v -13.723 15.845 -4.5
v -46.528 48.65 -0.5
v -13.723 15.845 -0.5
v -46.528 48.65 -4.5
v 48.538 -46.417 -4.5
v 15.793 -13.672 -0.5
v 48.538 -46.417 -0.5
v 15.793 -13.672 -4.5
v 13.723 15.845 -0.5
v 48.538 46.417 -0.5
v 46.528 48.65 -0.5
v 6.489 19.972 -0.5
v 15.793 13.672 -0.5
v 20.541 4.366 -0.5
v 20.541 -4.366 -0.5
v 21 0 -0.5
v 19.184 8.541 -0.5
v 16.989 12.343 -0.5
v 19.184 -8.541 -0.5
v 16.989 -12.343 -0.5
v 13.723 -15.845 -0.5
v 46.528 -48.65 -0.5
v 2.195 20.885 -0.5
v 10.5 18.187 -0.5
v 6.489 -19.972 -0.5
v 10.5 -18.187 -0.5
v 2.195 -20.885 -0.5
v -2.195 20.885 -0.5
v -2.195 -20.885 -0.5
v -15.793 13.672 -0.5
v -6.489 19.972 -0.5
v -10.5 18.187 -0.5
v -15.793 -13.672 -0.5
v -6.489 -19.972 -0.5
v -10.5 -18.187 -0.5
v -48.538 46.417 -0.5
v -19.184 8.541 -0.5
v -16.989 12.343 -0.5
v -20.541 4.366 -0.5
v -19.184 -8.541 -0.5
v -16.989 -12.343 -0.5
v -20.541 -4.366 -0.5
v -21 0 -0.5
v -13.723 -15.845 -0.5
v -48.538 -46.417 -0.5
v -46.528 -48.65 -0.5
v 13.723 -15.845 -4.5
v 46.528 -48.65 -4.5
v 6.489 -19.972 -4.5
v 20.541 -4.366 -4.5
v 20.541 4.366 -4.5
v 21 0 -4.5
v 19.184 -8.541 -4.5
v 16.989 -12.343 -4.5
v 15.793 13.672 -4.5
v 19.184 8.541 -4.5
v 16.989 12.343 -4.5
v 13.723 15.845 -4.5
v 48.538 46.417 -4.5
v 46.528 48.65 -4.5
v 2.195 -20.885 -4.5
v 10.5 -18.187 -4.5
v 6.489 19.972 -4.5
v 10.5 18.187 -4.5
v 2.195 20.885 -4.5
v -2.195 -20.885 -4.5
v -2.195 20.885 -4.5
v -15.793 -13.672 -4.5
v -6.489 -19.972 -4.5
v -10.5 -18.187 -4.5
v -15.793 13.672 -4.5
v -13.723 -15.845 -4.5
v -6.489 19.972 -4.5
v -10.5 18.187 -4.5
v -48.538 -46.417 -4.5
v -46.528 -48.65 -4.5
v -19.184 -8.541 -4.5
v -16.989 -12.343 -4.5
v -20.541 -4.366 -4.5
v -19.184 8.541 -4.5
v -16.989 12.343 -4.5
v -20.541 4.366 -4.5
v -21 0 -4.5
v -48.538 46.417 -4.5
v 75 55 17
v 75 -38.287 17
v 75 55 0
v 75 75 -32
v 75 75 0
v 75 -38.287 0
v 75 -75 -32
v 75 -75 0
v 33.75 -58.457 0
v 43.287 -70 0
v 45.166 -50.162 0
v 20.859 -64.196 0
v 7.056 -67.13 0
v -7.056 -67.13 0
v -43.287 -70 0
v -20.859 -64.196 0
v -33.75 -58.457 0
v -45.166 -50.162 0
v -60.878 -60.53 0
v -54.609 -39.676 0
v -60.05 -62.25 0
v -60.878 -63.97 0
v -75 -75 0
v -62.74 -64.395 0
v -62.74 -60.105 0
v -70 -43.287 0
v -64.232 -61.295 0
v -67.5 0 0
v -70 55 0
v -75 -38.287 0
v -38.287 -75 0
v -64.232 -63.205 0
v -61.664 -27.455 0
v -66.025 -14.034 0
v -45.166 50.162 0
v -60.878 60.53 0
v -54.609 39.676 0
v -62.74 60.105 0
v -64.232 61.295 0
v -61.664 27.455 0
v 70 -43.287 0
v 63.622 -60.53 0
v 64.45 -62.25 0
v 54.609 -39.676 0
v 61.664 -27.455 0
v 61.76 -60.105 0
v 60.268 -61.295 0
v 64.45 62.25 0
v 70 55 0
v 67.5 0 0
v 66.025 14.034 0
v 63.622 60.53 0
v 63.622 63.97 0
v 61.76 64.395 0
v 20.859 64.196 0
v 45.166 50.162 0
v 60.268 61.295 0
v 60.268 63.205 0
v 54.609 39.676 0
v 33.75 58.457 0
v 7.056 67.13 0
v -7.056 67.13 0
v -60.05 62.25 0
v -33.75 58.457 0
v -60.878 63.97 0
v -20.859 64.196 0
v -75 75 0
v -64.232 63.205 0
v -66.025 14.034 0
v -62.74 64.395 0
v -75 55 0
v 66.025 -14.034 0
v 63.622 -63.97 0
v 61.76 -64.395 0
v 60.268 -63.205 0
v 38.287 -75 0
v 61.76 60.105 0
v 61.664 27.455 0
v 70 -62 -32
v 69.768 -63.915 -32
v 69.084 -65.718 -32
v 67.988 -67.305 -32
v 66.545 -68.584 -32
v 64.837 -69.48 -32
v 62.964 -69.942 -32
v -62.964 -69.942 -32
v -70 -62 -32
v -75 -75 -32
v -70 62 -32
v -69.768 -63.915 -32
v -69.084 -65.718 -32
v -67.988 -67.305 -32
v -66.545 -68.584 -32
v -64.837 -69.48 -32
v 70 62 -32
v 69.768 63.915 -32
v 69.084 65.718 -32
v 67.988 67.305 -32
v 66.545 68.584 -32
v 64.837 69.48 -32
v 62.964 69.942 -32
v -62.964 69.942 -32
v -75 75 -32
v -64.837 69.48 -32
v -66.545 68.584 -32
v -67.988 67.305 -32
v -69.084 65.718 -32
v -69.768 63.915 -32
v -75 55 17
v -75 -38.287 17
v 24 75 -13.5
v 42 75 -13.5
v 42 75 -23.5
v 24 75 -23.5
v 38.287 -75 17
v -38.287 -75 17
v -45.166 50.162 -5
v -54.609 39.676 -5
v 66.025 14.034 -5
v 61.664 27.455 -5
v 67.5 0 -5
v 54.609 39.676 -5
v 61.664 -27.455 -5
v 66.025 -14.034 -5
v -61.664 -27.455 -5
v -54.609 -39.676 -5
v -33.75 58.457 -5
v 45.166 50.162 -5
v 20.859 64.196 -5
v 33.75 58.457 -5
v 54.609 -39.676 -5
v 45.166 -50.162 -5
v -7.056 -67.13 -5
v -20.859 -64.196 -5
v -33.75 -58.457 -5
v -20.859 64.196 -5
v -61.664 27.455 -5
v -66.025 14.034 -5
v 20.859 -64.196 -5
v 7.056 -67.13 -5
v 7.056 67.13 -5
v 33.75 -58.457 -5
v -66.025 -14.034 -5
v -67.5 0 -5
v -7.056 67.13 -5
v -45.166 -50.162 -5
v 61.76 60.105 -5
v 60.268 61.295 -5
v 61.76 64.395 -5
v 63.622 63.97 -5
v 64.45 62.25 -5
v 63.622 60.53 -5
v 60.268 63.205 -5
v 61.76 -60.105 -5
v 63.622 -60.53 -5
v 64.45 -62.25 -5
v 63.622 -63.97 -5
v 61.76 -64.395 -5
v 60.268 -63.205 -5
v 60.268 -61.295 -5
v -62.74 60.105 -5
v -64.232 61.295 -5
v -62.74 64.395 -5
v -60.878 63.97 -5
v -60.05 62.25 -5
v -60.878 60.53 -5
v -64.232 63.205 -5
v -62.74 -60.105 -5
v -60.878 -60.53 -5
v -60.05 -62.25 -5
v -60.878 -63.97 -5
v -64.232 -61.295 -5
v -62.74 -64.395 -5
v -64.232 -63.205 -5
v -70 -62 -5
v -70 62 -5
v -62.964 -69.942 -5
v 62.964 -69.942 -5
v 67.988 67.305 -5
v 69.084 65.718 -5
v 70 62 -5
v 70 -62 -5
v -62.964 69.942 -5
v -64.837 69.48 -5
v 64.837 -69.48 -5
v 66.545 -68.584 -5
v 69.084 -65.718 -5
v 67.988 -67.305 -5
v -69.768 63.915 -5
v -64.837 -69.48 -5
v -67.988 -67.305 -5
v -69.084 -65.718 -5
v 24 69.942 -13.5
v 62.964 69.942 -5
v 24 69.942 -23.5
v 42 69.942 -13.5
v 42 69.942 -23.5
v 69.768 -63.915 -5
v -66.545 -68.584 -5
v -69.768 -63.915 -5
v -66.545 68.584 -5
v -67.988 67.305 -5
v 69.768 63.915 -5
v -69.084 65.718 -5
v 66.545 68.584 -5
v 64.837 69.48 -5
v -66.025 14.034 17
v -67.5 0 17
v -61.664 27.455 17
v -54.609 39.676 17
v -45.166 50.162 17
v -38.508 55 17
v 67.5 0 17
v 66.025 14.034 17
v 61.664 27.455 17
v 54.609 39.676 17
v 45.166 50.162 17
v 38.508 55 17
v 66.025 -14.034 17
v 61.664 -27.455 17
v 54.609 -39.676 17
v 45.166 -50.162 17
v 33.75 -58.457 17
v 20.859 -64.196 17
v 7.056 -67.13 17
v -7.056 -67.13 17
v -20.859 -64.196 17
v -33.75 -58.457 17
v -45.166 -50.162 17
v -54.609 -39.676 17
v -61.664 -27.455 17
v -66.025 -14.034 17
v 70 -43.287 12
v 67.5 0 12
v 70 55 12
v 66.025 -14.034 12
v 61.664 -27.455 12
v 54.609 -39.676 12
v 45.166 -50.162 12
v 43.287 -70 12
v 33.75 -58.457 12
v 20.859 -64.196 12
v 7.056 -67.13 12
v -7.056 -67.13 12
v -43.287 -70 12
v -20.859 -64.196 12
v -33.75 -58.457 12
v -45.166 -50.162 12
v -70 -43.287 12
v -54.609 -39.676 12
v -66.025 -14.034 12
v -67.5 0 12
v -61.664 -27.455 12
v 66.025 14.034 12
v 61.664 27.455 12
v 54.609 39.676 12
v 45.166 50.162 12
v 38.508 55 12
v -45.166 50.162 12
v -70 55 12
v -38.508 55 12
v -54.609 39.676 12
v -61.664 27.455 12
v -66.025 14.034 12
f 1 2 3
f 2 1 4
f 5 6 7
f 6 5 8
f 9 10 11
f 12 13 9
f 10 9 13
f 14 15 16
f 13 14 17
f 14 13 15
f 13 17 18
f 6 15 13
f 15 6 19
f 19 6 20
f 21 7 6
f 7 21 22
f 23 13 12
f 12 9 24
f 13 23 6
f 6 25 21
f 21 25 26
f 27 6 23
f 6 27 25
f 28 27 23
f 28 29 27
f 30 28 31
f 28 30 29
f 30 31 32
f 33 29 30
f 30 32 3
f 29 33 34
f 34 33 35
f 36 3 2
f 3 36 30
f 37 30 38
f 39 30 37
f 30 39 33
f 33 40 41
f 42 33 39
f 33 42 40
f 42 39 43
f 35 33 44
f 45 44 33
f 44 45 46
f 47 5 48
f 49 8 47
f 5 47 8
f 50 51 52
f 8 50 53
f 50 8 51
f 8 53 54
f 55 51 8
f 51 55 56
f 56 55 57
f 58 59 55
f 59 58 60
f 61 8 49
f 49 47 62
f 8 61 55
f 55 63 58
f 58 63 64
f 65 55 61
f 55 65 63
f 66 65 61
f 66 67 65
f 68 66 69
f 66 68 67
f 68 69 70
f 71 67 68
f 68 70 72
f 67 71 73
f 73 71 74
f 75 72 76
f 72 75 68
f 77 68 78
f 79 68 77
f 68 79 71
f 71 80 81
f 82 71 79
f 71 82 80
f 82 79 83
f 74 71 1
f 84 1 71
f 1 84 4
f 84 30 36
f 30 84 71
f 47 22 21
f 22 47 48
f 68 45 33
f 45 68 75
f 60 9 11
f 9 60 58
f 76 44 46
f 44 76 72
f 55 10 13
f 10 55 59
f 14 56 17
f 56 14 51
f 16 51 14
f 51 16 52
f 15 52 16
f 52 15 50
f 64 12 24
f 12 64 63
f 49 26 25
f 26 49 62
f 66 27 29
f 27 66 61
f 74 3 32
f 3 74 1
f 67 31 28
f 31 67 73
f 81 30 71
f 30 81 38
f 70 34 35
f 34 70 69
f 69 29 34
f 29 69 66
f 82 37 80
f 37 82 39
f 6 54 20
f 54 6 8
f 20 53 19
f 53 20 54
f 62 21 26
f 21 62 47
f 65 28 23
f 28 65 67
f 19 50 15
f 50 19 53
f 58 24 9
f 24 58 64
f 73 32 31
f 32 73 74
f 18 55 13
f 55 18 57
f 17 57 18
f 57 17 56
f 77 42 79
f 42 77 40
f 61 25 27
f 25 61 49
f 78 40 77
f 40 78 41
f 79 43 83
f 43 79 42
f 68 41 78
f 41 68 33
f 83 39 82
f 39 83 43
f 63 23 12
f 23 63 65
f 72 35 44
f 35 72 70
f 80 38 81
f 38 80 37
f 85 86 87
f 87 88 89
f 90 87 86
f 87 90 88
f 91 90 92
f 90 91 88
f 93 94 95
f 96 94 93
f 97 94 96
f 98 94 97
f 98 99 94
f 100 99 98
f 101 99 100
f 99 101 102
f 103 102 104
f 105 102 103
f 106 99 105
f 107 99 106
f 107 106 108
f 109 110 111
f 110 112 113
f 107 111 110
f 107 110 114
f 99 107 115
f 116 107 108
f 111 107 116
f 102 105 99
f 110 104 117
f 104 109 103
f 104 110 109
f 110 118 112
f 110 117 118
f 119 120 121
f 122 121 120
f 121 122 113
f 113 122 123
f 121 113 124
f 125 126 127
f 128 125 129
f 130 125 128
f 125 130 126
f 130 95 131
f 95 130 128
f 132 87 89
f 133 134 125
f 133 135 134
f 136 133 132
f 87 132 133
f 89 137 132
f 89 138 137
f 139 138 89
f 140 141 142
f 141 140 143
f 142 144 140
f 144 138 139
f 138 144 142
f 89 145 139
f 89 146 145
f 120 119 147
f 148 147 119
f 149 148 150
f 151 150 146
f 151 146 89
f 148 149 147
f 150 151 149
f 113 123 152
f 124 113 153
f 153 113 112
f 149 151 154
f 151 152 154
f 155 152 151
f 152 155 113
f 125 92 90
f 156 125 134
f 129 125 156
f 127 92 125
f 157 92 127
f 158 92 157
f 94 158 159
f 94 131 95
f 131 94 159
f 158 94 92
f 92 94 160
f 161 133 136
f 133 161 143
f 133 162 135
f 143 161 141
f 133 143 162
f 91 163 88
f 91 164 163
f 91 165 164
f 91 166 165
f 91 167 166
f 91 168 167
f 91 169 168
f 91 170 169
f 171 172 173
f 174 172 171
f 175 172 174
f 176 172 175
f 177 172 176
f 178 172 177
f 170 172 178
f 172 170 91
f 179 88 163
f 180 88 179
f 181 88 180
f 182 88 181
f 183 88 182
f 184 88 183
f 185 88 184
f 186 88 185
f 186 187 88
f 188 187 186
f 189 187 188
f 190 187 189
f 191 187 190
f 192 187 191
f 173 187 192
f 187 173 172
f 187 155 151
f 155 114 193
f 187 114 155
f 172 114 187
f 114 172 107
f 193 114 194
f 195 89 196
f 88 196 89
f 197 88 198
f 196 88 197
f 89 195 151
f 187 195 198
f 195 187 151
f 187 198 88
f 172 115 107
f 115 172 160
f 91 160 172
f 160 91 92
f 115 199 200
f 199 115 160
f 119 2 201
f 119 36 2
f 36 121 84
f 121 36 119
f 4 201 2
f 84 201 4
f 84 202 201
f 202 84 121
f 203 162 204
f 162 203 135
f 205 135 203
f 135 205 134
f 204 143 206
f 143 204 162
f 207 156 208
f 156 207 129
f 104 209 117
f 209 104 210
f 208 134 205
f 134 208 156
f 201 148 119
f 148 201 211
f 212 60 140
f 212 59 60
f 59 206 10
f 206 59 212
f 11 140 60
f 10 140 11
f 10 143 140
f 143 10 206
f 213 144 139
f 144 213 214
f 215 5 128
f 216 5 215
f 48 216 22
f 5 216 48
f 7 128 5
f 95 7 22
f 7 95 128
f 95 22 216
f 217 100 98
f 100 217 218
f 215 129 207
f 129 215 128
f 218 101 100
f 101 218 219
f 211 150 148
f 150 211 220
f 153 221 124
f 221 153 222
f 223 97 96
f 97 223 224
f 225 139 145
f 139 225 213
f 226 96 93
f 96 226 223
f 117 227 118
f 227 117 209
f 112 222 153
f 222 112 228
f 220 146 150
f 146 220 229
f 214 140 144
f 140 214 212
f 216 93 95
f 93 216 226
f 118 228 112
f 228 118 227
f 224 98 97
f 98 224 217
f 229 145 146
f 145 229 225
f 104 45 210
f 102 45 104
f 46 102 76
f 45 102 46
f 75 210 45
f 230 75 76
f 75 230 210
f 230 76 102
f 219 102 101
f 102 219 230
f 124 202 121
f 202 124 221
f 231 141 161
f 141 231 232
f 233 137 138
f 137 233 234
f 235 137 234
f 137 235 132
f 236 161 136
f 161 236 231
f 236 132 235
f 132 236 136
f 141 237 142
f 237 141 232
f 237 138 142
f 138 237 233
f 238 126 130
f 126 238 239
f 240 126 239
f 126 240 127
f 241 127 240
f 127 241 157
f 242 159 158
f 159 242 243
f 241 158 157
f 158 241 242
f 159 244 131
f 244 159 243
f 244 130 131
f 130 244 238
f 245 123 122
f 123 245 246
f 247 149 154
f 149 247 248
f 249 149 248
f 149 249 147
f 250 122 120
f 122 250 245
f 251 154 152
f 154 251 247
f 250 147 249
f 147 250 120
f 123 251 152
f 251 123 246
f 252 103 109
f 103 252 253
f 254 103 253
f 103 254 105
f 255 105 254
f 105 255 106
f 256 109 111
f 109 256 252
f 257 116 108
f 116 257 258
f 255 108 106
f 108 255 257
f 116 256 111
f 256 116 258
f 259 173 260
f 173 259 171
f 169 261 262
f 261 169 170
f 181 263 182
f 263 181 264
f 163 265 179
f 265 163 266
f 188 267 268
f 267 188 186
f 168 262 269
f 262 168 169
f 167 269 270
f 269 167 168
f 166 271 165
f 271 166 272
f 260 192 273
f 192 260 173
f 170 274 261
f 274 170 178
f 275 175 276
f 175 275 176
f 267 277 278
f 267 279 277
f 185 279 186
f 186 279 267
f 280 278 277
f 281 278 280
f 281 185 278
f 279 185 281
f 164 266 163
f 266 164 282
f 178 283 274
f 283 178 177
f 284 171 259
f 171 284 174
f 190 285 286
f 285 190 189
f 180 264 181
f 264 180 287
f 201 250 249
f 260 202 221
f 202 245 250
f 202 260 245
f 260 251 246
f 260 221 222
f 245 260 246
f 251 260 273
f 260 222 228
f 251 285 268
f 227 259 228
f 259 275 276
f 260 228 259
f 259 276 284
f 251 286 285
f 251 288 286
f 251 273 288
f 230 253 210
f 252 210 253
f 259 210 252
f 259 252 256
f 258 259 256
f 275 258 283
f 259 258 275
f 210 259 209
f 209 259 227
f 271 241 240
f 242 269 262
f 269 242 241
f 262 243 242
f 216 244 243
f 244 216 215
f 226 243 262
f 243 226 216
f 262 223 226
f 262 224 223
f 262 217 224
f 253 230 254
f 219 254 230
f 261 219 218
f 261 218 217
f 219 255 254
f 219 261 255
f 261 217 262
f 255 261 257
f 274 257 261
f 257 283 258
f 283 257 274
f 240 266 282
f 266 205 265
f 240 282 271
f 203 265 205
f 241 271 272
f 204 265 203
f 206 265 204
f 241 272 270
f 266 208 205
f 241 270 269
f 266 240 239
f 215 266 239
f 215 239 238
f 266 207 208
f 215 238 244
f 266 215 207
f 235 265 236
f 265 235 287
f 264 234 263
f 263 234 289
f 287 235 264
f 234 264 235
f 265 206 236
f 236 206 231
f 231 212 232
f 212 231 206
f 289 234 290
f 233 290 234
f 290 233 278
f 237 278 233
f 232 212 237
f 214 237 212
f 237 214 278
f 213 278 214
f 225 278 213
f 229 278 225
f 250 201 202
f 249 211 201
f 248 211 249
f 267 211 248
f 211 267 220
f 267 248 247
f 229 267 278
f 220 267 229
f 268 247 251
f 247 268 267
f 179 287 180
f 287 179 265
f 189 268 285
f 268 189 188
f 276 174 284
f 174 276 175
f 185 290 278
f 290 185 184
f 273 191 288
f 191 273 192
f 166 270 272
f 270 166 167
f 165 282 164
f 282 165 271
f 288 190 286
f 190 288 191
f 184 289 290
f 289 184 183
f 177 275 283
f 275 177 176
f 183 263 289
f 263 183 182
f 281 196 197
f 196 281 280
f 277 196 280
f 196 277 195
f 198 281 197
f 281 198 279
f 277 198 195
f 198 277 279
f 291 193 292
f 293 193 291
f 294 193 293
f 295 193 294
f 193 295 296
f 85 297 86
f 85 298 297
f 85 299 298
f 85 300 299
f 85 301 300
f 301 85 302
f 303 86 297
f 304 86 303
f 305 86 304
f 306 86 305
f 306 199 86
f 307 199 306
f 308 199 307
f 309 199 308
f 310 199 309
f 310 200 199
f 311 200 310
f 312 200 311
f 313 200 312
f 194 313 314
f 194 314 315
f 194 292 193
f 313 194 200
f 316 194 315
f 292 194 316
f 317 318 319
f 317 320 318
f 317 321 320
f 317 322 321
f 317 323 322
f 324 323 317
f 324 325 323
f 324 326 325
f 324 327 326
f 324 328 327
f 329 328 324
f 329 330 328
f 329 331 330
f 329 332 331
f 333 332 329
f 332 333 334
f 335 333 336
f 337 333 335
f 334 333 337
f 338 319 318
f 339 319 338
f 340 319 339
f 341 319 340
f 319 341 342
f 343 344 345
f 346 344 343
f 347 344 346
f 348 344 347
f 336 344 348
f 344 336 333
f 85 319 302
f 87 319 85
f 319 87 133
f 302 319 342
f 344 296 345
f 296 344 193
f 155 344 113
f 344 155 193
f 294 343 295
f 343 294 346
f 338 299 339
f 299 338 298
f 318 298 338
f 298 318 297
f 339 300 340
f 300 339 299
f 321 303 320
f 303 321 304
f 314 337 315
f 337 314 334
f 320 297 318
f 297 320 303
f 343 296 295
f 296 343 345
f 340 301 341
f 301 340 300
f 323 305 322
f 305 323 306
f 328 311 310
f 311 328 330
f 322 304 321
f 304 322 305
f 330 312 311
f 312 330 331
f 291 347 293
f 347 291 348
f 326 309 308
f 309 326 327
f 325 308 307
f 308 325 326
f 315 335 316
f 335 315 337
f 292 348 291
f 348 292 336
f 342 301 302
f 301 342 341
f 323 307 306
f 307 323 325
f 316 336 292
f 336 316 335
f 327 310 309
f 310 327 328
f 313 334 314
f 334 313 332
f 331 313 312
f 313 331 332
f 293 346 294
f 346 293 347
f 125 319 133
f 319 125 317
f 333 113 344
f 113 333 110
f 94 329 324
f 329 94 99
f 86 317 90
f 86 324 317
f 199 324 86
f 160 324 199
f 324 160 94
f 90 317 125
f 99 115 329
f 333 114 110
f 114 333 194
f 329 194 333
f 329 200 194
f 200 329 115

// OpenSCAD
fan_side = 140;
side = fan_side + 10;
// Hole margin, i.e. offset of screw hole from edge of fan.
hole_margin = (fan_side - 124.5) / 2;
filter_thickness = 10;
plate_thickness = 5;
filter_brace_thickness = 5;
filter_brace_width = 20;
fan_d = 135;
fan_thickness = 27;
module screw_hole (x, y) {
  translate([x, y, 0])
    cylinder(h = 40, r = 2.2, center = true);
}

module filter_brace(width, thickness) {
    cube([width, thickness, 115], center = true);
}

module filter_brace_side(width, thickness) {
 rotate([0, 0, 90])
    filter_brace(width, thickness);}

module plate(height, thickness) {
  difference()
  {
    translate([0, -(side-height)/2, -thickness/2])
      cube([side, height, thickness], center = true);
      cylinder(h = 40, r = fan_d/2, center = true);
  }
}

// Separator between fan and filter.
translate([0, 0, -(plate_thickness)/2]) {
  cylinder(h = plate_thickness-1, r = 42/2, center = true);
  rotate([0, 0, 45]) {
    cube([3, fan_side, plate_thickness-1], center = true);
    cube([fan_side, 3, plate_thickness-1], center = true);
  }
}

// Fan holder.
hole_offset = fan_side/2 - hole_margin;
difference() {
  plate(side, plate_thickness + fan_thickness);
  // Remove screw holes.
  screw_hole(hole_offset, hole_offset);
  screw_hole(hole_offset, -hole_offset);
  screw_hole(-hole_offset, hole_offset);
  screw_hole(-hole_offset, -hole_offset);
  // Cavity for fan.
  translate([-(fan_side/2 - 8), -(fan_side/2 - 8), -(fan_thickness + plate_thickness + 20)])
    linear_extrude(height = fan_thickness + 20)
      minkowski() {
        square([fan_side - 8*2, fan_side - 8*2]);
        circle(r = 8);
      }
  // Hole for cable.
  translate([(fan_side - 18) / 2 - 28, fan_side/2, -(fan_thickness - 10)/2 - plate_thickness - 10/2])
    cube([18, 20, 10], center = true);
}




// Filter holder.
translate([0, 0, 12 + plate_thickness])
  difference() {
    union() {
      plate(side - 20, plate_thickness);
      translate([0, -20/2, -(12/2 + plate_thickness)])
        difference() {
          cube([side, side - 20, 13], center = true);
          translate([0, side - fan_side, 0])
            cube([fan_side, fan_side, 50], center = true);
        }
    }
    translate([hole_offset + 5, -(hole_offset + 5), 0])
      rotate([0, 0, 45])
        cube([150, 30, 50], center = true);
    translate([-(hole_offset + 5), -(hole_offset + 5), 0])
      rotate([0, 0, -45])
        cube([150, 30, 50], center = true);
  }
